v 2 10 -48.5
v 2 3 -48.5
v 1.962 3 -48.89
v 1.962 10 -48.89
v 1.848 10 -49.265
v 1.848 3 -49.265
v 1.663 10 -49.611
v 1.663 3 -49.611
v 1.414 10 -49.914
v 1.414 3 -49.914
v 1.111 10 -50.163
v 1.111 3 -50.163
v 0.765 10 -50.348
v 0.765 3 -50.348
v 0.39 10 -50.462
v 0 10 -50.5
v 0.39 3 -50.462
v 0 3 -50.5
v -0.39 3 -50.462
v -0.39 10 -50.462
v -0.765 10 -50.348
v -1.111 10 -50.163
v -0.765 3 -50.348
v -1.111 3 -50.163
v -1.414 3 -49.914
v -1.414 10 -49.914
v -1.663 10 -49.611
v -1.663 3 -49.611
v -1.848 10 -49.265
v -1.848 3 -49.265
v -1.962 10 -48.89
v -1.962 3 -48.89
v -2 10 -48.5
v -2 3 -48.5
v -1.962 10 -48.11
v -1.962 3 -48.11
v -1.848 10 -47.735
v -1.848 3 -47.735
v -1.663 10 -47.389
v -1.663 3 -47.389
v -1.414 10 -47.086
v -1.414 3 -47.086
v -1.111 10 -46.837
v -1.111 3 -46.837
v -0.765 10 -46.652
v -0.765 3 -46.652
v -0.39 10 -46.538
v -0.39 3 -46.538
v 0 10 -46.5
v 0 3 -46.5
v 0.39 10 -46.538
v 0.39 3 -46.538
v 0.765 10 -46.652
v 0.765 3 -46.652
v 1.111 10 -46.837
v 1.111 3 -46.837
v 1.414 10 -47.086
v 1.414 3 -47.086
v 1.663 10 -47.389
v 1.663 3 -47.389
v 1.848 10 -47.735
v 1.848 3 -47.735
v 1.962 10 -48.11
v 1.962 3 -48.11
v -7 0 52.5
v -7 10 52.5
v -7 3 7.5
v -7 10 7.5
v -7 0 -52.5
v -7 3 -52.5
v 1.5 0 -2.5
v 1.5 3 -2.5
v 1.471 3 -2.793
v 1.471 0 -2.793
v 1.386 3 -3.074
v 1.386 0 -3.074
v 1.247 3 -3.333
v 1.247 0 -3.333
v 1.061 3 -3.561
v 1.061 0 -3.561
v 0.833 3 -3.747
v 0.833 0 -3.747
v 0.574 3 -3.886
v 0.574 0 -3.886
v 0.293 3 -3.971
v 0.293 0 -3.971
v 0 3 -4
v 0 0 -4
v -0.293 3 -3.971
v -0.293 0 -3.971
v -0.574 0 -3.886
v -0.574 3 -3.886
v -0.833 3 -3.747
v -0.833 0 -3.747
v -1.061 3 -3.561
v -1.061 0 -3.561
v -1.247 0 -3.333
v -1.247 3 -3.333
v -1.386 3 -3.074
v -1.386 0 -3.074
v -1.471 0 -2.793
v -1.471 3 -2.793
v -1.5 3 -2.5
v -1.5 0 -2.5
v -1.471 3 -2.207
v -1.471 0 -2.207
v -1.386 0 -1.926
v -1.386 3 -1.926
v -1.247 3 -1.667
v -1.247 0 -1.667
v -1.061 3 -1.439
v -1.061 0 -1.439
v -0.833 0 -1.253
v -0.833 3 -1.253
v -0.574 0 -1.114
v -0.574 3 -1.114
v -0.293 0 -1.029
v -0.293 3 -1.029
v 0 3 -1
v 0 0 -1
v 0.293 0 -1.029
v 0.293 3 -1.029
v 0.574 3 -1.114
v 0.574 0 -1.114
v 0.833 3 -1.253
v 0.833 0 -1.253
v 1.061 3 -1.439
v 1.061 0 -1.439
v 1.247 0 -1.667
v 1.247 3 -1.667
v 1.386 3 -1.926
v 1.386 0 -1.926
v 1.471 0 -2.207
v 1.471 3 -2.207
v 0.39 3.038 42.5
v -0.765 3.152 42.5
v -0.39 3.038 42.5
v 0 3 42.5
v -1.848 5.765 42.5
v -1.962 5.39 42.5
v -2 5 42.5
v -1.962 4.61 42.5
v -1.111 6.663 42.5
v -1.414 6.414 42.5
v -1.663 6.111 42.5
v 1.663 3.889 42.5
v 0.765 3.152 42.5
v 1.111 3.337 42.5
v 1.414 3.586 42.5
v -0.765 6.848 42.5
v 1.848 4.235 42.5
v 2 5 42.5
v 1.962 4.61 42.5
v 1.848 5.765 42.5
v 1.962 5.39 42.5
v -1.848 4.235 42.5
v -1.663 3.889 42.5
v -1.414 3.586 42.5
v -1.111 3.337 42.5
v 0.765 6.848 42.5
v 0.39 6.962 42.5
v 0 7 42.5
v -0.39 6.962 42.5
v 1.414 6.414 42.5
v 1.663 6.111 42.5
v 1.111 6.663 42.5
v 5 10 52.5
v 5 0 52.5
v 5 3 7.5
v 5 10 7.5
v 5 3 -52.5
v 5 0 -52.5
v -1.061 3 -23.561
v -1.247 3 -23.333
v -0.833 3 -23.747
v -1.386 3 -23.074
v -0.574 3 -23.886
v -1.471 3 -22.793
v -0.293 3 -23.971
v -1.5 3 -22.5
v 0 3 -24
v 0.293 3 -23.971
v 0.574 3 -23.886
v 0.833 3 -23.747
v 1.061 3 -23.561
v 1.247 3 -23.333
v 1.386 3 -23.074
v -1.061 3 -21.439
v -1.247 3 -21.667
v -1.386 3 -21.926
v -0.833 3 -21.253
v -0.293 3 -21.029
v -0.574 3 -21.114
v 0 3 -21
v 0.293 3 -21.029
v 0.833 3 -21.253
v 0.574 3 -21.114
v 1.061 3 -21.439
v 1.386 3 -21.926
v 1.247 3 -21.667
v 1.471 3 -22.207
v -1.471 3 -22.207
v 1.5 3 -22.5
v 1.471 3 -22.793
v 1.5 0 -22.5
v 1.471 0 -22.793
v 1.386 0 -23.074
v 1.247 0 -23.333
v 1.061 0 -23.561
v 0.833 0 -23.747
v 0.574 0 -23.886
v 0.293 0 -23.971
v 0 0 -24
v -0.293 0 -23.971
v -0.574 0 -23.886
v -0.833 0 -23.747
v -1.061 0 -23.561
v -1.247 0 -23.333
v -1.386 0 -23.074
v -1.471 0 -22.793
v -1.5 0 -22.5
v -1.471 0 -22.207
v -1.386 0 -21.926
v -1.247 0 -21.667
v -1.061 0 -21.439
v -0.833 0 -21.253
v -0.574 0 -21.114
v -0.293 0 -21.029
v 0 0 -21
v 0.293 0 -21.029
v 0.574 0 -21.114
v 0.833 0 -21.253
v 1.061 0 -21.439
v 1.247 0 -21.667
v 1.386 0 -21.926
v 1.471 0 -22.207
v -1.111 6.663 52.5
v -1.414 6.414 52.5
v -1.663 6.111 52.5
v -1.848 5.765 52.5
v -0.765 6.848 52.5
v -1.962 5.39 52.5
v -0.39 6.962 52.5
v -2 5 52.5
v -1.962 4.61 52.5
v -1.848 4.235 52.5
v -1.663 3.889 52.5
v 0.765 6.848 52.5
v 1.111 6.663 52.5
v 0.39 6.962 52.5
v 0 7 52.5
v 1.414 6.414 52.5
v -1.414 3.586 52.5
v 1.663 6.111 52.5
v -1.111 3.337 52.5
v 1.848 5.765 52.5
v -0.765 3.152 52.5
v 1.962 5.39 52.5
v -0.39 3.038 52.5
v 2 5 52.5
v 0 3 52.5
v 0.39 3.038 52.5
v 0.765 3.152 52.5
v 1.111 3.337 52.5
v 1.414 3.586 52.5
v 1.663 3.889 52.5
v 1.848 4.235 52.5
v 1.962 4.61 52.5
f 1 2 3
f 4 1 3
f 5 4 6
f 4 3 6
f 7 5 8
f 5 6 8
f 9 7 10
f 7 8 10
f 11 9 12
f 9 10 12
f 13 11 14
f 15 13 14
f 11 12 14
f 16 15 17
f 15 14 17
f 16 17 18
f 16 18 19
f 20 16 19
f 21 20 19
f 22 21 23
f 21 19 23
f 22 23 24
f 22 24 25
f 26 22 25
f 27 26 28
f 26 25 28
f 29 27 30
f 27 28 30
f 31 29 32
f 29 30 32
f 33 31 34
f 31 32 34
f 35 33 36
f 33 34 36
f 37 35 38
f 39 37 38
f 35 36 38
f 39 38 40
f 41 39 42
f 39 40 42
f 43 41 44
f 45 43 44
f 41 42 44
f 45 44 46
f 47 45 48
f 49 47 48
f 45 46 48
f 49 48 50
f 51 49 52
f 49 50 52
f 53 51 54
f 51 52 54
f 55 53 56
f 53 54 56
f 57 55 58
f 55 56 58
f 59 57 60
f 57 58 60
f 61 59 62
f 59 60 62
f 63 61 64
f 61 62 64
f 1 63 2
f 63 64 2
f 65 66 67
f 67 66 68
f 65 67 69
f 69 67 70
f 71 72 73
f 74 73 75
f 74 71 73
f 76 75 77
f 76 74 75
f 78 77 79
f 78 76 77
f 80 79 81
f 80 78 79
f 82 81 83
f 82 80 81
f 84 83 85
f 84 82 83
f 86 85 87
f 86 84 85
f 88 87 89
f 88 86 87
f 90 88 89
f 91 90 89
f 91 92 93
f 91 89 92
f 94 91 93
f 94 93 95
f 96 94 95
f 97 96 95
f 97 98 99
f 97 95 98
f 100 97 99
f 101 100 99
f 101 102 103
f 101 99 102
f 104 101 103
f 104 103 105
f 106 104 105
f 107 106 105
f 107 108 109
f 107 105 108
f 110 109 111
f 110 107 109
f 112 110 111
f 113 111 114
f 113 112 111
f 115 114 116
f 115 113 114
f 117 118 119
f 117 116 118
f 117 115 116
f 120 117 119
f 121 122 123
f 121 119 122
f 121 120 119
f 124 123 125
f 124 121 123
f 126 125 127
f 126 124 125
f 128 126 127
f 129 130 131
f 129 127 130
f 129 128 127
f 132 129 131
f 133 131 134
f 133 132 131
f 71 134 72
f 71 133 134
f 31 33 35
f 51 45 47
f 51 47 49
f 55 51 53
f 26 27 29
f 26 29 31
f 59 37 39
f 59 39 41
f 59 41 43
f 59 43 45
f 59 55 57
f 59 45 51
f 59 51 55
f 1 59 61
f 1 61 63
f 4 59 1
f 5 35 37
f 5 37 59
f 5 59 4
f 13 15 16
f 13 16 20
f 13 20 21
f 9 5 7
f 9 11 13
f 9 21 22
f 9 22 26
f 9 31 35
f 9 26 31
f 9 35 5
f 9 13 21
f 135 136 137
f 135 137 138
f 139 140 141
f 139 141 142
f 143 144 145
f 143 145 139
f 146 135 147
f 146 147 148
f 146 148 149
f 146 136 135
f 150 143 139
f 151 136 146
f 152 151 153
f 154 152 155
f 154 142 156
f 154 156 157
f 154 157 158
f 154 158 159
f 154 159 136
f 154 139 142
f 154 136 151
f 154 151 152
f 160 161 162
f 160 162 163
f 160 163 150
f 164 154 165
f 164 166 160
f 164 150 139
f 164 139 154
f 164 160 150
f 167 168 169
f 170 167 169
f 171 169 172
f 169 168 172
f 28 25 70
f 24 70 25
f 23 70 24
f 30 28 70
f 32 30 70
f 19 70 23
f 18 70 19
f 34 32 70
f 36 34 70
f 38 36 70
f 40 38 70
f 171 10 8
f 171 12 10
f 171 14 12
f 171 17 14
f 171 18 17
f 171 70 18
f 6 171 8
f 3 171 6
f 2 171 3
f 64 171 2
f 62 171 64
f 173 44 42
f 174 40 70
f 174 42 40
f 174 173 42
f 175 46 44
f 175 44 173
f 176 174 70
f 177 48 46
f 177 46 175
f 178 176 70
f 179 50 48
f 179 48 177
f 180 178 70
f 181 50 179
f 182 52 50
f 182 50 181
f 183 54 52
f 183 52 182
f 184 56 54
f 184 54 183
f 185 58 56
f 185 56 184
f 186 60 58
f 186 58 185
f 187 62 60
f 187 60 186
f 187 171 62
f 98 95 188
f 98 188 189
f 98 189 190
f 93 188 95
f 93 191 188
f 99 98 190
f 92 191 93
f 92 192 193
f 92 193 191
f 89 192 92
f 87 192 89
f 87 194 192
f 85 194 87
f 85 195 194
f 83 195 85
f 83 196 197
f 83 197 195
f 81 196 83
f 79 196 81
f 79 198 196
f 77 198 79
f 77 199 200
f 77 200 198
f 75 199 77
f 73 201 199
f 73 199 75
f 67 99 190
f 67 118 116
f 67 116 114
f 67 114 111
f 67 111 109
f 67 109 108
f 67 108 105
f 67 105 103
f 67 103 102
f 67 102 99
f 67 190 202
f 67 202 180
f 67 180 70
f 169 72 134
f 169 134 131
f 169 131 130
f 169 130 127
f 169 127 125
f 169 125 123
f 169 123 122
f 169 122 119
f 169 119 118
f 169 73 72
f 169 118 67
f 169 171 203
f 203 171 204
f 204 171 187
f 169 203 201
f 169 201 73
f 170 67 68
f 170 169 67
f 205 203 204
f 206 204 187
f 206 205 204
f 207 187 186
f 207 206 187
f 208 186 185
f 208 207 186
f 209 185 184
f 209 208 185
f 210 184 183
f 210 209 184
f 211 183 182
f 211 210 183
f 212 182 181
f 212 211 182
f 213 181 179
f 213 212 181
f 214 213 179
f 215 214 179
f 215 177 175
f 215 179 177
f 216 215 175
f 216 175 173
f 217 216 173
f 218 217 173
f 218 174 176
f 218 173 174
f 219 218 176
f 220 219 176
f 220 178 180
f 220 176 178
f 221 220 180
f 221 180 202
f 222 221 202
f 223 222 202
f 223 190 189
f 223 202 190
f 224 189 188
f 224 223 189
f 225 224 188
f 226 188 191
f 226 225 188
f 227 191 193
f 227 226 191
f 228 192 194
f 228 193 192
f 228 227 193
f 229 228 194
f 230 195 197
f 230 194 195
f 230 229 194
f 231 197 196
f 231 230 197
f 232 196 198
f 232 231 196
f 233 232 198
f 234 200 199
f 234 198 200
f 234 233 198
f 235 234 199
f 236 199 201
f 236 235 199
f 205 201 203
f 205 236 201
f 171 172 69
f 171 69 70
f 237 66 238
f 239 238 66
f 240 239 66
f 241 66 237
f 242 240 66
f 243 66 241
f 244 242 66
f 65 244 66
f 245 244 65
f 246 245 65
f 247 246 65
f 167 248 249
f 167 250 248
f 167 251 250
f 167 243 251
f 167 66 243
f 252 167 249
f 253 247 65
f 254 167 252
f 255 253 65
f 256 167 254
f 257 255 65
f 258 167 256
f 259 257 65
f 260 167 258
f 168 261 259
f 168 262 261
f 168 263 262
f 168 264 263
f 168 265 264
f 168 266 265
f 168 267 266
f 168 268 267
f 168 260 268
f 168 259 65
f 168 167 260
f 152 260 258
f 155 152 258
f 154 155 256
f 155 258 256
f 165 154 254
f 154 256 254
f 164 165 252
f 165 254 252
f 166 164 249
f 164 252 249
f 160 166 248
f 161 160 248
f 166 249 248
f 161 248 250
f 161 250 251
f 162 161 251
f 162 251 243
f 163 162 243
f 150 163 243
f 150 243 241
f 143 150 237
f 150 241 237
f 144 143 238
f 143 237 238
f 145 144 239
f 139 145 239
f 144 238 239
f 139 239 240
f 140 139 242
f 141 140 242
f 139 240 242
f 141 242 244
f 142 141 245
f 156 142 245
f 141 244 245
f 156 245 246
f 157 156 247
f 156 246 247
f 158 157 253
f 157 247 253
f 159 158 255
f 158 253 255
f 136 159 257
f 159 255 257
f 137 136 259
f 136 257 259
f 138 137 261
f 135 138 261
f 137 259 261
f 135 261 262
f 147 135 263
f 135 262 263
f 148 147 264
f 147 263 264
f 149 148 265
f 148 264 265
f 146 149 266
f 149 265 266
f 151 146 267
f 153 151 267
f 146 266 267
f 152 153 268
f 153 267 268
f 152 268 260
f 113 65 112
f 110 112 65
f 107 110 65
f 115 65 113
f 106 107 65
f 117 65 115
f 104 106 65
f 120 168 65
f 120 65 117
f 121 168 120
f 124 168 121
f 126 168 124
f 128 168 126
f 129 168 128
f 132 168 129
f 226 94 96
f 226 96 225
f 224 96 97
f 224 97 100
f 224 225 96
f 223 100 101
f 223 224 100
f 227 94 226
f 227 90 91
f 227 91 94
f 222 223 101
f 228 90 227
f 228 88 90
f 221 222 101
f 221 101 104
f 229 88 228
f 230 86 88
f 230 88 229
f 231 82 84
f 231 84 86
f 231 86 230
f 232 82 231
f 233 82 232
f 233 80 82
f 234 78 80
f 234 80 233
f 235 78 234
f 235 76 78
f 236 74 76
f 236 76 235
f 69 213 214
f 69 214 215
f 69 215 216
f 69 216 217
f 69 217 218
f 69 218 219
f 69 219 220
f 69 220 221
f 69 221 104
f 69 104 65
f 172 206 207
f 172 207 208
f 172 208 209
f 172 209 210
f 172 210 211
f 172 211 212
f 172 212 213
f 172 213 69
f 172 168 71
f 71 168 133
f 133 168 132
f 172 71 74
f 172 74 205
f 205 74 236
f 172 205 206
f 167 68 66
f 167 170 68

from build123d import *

# Parameters (mm, degrees)
SKETCH1_W               = 10
SKETCH1_H               = 105
BOSS_EXTRUDE1_DEPTH     = 10
SKETCH2_W               = 60
SKETCH2_H               = 13.095712102
CUT_EXTRUDE1_DEPTH      = 10
CUT_EXTRUDE1_DEPTH_BACK = 10
SKETCH3_R               = 2
BOSS_EXTRUDE2_DEPTH     = 7
SKETCH4_R               = 1.5
CUT_EXTRUDE2_DEPTH      = 14
SKETCH5_R               = 2
CUT_EXTRUDE3_DEPTH      = 10
BOSS_EXTRUDE3_DEPTH     = 2


with BuildPart() as part:
    # Sketch1 → Boss-Extrude1 (new body)
    with BuildSketch(Plane(origin=(0, 0, 0), x_dir=(1, 0, 0), z_dir=(0, 1, 0))):
        Rectangle(SKETCH1_W, SKETCH1_H)
    extrude(amount=BOSS_EXTRUDE1_DEPTH)

    # Sketch2 → Cut-Extrude1 (cut, two sides)
    with BuildSketch(Plane(origin=(0, 0, 0), x_dir=(0, 0, -1), z_dir=(1, 0, 0))) as cut_extrude1_sk:
        with Locations((22.5, 9.547856051)):
            Rectangle(SKETCH2_W, SKETCH2_H)
    extrude(amount=CUT_EXTRUDE1_DEPTH, mode=Mode.SUBTRACT)
    extrude(cut_extrude1_sk.sketch, amount=-CUT_EXTRUDE1_DEPTH_BACK, mode=Mode.SUBTRACT)

    # Sketch3 → Boss-Extrude2 (add)
    with BuildSketch(Plane(origin=(0, 3, 0), x_dir=(1, 0, 0), z_dir=(0, 1, 0))):
        with Locations((0, 48.5)):
            Circle(SKETCH3_R)
    extrude(amount=BOSS_EXTRUDE2_DEPTH)

    # Sketch4 → Cut-Extrude2 (cut)
    with BuildSketch(Plane(origin=(0, 0, 0), x_dir=(1, 0, 0), z_dir=(0, 1, 0))):
        with Locations((0, 2.5)):
            Circle(SKETCH4_R)
        with Locations((0, 22.5)):
            Circle(SKETCH4_R)
    extrude(amount=CUT_EXTRUDE2_DEPTH, mode=Mode.SUBTRACT)

    # Sketch5 → Cut-Extrude3 (cut)
    with BuildSketch(Plane.XY.offset(52.5)):
        with Locations((0, 5)):
            Circle(SKETCH5_R)
    extrude(amount=-CUT_EXTRUDE3_DEPTH, mode=Mode.SUBTRACT)

    # Sketch6 → Boss-Extrude3 (add)
    with BuildSketch(Plane.ZY.offset(5)):
        Polygon((7.5, 10), (52.5, 10), (52.5, 0), (-52.5, 0), (-52.5, 3), (7.5, 3), align=None)
    extrude(amount=BOSS_EXTRUDE3_DEPTH)


solid = part.part
